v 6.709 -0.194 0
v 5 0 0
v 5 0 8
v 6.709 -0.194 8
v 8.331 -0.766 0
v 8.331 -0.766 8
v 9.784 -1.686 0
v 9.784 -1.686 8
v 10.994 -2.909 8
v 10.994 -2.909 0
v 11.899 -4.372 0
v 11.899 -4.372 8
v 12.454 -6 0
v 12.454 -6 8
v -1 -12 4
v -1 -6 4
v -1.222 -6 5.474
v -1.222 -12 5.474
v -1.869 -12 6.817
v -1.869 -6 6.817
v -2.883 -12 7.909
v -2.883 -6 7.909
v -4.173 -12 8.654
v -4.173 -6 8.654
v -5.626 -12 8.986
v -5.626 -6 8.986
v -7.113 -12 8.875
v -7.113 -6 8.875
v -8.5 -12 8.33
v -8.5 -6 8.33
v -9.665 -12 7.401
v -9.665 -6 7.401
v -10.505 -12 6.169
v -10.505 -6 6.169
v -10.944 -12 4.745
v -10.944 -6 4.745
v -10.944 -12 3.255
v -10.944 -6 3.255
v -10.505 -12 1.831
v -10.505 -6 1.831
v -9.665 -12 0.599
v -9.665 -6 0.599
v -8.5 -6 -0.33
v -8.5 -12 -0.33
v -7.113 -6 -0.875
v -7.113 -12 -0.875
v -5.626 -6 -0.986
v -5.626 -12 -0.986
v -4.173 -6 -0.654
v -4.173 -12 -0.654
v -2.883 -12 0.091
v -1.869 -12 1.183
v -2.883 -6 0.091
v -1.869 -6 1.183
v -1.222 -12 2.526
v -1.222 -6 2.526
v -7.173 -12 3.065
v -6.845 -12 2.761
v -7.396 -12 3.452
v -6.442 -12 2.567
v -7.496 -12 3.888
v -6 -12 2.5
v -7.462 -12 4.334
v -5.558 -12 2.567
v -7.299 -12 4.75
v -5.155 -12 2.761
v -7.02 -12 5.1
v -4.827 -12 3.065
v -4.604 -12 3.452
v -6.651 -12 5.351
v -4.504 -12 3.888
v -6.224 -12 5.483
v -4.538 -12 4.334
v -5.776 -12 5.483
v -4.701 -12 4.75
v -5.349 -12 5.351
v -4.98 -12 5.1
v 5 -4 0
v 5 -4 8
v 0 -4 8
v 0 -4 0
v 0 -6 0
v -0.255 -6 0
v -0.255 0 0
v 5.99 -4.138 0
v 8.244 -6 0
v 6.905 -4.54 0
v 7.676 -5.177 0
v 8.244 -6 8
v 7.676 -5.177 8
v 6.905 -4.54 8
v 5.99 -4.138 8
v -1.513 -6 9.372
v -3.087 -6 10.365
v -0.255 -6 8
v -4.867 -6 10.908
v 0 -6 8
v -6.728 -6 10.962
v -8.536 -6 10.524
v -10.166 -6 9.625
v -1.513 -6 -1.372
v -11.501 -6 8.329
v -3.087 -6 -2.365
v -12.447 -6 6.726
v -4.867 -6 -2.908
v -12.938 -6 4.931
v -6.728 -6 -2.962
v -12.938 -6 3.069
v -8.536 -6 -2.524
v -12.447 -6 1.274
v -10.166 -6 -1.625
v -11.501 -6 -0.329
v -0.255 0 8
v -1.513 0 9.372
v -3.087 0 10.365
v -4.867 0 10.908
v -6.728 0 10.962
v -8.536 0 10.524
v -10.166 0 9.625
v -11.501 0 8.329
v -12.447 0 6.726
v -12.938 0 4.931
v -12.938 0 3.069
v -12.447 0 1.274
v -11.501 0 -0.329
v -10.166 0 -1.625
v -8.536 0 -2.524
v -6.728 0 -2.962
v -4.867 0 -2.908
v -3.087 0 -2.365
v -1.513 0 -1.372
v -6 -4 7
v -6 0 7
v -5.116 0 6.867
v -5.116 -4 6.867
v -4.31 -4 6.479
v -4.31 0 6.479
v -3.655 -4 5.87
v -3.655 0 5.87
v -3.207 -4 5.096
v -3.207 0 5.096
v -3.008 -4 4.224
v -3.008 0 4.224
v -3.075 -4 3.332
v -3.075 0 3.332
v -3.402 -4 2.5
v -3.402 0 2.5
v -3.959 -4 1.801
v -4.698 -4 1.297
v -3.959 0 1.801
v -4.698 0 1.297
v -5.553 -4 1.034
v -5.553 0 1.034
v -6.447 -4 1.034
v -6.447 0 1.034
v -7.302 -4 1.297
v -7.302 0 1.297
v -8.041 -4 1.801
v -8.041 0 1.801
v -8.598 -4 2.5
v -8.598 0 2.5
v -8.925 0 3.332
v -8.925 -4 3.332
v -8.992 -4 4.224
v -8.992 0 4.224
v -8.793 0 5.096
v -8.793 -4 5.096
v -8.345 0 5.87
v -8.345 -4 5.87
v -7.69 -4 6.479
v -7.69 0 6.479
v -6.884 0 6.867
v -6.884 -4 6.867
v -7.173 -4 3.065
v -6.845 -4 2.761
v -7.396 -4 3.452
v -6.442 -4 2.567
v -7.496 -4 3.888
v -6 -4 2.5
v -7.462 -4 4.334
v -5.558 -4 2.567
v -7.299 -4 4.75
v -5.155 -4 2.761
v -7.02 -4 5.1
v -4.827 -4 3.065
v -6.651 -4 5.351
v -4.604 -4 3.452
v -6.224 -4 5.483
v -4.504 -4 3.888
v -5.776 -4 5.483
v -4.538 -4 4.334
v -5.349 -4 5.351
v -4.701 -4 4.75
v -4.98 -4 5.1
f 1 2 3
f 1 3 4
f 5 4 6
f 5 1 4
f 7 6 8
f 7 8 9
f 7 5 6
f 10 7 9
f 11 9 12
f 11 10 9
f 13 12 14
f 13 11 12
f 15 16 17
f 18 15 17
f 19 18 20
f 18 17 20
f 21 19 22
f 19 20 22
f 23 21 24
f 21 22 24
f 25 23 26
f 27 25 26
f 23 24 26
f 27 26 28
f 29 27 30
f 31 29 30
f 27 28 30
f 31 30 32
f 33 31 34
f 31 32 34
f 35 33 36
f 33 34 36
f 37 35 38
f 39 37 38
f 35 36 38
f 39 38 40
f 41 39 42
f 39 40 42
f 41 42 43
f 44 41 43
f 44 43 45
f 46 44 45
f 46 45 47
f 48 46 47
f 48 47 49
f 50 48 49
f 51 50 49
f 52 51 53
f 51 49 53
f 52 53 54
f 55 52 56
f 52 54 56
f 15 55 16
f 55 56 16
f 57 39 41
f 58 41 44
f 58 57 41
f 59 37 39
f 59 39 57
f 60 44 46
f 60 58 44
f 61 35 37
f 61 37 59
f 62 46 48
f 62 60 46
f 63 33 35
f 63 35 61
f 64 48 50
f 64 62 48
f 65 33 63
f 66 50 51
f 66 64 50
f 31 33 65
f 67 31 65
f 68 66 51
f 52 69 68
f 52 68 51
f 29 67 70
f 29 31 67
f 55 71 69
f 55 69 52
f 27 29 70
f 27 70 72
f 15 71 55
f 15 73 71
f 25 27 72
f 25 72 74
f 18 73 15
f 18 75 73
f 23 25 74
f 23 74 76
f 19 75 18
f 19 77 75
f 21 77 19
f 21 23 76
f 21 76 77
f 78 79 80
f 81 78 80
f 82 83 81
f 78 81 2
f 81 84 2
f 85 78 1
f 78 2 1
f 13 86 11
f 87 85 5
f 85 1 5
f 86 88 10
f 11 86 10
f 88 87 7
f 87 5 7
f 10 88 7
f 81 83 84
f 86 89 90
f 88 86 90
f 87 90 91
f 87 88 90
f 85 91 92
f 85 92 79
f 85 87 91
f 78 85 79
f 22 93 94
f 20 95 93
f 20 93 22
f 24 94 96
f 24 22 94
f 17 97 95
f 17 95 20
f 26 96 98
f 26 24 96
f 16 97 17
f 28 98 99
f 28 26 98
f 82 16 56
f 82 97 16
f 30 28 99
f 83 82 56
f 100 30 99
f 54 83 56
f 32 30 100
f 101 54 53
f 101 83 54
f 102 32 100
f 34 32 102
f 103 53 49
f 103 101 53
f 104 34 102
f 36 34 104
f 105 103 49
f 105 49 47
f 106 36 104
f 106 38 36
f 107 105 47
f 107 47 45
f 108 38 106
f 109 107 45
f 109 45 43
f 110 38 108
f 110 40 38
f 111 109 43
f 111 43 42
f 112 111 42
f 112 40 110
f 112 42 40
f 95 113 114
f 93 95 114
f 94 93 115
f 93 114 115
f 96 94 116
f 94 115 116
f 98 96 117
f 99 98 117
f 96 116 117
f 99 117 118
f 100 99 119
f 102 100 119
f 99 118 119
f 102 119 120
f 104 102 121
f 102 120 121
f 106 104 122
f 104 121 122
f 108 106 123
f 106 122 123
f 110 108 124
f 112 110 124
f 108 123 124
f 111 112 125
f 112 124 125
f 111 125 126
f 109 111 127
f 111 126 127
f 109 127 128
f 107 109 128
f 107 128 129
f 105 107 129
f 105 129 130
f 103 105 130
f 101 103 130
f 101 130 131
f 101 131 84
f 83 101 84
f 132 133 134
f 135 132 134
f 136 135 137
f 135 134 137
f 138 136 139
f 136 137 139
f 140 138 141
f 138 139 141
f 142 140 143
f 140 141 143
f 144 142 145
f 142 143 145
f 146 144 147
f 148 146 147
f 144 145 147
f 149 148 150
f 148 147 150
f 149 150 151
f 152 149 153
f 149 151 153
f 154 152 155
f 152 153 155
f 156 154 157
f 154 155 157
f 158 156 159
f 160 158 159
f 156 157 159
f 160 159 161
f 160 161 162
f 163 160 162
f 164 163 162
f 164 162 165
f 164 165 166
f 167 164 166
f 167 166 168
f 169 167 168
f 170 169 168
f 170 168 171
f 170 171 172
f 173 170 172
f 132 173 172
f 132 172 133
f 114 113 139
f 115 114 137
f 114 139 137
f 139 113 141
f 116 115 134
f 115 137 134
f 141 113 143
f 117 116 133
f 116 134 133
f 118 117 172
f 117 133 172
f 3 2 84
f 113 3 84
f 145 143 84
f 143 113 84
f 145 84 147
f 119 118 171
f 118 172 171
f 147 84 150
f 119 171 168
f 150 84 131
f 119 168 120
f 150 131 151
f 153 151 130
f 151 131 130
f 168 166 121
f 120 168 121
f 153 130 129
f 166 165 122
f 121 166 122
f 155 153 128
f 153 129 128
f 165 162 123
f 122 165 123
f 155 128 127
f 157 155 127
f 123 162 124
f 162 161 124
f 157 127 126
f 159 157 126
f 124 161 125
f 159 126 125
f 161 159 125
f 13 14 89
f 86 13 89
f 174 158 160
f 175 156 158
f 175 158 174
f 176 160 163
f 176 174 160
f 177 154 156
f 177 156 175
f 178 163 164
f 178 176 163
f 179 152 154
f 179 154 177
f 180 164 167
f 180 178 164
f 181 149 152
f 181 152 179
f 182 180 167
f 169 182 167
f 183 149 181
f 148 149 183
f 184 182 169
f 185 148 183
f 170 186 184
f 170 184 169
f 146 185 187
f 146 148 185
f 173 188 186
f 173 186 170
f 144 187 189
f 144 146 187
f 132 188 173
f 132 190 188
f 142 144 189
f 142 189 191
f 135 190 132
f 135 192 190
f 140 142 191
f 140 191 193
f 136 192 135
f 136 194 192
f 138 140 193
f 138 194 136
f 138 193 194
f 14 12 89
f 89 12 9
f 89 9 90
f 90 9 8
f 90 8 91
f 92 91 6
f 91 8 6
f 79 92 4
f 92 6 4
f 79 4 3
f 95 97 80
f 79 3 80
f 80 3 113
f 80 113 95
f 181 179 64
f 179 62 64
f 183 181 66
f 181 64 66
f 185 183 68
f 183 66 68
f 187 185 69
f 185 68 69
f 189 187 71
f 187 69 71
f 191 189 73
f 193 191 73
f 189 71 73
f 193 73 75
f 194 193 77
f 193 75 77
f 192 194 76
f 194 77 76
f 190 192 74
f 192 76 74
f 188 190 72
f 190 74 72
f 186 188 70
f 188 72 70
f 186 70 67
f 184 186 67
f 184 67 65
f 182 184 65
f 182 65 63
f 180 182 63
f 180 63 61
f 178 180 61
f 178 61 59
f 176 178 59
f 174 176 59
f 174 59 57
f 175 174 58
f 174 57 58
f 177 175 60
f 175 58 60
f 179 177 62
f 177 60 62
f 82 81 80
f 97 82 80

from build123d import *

# Parameters (mm, degrees)
EXTRUDE_1_DEPTH           = 8
EXTRUDE_2_DEPTH           = 6
SKETCH_5_R                = 5
EXTRUDE_3_DEPTH           = 6
HOLE_WIZARD_1_D           = 3
HOLE_WIZARD_1_DEPTH       = 30
HOLE_WIZARD_1_CBORE_D     = 6
HOLE_WIZARD_1_CBORE_DEPTH = 4


with BuildPart() as part:
    # 草图3 → 凸台-拉伸1 (new body)
    with BuildSketch(Plane.XY):
        with BuildLine():
            Line((0, 0), (5, 0))
            ThreePointArc((5, 0), (9.784396345, -1.68635165), (12.453978369, -6))
            Line((12.453978369, -6), (8.243547108, -6))
            ThreePointArc((8.243547108, -6), (6.905295111, -4.540192237), (5, -4))
            Line((5, -4), (0, -4))
            Line((0, -4), (0, 0))
        make_face()
    extrude(amount=EXTRUDE_1_DEPTH)

    # 草图4 → 凸台-拉伸2 (add)
    with BuildSketch(Plane(origin=(0, 0, 0), x_dir=(1, 0, 0), z_dir=(0, 1, 0))):
        with BuildLine():
            Line((-0.255437353, 0), (0, 0))
            Line((0, 0), (0, -8))
            Line((0, -8), (-0.255437353, -8))
            ThreePointArc((-0.255437353, -8), (-13, -4), (-0.255437353, 0))
        make_face()
    extrude(amount=-EXTRUDE_2_DEPTH)

    # 草图5 → 凸台-拉伸3 (add)
    with BuildSketch(Plane.XZ.offset(6)):
        with Locations((-6, 4)):
            Circle(SKETCH_5_R)
    extrude(amount=EXTRUDE_3_DEPTH)

    # 孔1
    with Locations(Plane(origin=(-6, 0, 4), x_dir=(0, 0, 1), z_dir=(0, 1, 0))):
        with Locations((0, 0)):
            CounterBoreHole(HOLE_WIZARD_1_D / 2, HOLE_WIZARD_1_CBORE_D / 2, HOLE_WIZARD_1_CBORE_DEPTH, depth=HOLE_WIZARD_1_DEPTH)


solid = part.part
